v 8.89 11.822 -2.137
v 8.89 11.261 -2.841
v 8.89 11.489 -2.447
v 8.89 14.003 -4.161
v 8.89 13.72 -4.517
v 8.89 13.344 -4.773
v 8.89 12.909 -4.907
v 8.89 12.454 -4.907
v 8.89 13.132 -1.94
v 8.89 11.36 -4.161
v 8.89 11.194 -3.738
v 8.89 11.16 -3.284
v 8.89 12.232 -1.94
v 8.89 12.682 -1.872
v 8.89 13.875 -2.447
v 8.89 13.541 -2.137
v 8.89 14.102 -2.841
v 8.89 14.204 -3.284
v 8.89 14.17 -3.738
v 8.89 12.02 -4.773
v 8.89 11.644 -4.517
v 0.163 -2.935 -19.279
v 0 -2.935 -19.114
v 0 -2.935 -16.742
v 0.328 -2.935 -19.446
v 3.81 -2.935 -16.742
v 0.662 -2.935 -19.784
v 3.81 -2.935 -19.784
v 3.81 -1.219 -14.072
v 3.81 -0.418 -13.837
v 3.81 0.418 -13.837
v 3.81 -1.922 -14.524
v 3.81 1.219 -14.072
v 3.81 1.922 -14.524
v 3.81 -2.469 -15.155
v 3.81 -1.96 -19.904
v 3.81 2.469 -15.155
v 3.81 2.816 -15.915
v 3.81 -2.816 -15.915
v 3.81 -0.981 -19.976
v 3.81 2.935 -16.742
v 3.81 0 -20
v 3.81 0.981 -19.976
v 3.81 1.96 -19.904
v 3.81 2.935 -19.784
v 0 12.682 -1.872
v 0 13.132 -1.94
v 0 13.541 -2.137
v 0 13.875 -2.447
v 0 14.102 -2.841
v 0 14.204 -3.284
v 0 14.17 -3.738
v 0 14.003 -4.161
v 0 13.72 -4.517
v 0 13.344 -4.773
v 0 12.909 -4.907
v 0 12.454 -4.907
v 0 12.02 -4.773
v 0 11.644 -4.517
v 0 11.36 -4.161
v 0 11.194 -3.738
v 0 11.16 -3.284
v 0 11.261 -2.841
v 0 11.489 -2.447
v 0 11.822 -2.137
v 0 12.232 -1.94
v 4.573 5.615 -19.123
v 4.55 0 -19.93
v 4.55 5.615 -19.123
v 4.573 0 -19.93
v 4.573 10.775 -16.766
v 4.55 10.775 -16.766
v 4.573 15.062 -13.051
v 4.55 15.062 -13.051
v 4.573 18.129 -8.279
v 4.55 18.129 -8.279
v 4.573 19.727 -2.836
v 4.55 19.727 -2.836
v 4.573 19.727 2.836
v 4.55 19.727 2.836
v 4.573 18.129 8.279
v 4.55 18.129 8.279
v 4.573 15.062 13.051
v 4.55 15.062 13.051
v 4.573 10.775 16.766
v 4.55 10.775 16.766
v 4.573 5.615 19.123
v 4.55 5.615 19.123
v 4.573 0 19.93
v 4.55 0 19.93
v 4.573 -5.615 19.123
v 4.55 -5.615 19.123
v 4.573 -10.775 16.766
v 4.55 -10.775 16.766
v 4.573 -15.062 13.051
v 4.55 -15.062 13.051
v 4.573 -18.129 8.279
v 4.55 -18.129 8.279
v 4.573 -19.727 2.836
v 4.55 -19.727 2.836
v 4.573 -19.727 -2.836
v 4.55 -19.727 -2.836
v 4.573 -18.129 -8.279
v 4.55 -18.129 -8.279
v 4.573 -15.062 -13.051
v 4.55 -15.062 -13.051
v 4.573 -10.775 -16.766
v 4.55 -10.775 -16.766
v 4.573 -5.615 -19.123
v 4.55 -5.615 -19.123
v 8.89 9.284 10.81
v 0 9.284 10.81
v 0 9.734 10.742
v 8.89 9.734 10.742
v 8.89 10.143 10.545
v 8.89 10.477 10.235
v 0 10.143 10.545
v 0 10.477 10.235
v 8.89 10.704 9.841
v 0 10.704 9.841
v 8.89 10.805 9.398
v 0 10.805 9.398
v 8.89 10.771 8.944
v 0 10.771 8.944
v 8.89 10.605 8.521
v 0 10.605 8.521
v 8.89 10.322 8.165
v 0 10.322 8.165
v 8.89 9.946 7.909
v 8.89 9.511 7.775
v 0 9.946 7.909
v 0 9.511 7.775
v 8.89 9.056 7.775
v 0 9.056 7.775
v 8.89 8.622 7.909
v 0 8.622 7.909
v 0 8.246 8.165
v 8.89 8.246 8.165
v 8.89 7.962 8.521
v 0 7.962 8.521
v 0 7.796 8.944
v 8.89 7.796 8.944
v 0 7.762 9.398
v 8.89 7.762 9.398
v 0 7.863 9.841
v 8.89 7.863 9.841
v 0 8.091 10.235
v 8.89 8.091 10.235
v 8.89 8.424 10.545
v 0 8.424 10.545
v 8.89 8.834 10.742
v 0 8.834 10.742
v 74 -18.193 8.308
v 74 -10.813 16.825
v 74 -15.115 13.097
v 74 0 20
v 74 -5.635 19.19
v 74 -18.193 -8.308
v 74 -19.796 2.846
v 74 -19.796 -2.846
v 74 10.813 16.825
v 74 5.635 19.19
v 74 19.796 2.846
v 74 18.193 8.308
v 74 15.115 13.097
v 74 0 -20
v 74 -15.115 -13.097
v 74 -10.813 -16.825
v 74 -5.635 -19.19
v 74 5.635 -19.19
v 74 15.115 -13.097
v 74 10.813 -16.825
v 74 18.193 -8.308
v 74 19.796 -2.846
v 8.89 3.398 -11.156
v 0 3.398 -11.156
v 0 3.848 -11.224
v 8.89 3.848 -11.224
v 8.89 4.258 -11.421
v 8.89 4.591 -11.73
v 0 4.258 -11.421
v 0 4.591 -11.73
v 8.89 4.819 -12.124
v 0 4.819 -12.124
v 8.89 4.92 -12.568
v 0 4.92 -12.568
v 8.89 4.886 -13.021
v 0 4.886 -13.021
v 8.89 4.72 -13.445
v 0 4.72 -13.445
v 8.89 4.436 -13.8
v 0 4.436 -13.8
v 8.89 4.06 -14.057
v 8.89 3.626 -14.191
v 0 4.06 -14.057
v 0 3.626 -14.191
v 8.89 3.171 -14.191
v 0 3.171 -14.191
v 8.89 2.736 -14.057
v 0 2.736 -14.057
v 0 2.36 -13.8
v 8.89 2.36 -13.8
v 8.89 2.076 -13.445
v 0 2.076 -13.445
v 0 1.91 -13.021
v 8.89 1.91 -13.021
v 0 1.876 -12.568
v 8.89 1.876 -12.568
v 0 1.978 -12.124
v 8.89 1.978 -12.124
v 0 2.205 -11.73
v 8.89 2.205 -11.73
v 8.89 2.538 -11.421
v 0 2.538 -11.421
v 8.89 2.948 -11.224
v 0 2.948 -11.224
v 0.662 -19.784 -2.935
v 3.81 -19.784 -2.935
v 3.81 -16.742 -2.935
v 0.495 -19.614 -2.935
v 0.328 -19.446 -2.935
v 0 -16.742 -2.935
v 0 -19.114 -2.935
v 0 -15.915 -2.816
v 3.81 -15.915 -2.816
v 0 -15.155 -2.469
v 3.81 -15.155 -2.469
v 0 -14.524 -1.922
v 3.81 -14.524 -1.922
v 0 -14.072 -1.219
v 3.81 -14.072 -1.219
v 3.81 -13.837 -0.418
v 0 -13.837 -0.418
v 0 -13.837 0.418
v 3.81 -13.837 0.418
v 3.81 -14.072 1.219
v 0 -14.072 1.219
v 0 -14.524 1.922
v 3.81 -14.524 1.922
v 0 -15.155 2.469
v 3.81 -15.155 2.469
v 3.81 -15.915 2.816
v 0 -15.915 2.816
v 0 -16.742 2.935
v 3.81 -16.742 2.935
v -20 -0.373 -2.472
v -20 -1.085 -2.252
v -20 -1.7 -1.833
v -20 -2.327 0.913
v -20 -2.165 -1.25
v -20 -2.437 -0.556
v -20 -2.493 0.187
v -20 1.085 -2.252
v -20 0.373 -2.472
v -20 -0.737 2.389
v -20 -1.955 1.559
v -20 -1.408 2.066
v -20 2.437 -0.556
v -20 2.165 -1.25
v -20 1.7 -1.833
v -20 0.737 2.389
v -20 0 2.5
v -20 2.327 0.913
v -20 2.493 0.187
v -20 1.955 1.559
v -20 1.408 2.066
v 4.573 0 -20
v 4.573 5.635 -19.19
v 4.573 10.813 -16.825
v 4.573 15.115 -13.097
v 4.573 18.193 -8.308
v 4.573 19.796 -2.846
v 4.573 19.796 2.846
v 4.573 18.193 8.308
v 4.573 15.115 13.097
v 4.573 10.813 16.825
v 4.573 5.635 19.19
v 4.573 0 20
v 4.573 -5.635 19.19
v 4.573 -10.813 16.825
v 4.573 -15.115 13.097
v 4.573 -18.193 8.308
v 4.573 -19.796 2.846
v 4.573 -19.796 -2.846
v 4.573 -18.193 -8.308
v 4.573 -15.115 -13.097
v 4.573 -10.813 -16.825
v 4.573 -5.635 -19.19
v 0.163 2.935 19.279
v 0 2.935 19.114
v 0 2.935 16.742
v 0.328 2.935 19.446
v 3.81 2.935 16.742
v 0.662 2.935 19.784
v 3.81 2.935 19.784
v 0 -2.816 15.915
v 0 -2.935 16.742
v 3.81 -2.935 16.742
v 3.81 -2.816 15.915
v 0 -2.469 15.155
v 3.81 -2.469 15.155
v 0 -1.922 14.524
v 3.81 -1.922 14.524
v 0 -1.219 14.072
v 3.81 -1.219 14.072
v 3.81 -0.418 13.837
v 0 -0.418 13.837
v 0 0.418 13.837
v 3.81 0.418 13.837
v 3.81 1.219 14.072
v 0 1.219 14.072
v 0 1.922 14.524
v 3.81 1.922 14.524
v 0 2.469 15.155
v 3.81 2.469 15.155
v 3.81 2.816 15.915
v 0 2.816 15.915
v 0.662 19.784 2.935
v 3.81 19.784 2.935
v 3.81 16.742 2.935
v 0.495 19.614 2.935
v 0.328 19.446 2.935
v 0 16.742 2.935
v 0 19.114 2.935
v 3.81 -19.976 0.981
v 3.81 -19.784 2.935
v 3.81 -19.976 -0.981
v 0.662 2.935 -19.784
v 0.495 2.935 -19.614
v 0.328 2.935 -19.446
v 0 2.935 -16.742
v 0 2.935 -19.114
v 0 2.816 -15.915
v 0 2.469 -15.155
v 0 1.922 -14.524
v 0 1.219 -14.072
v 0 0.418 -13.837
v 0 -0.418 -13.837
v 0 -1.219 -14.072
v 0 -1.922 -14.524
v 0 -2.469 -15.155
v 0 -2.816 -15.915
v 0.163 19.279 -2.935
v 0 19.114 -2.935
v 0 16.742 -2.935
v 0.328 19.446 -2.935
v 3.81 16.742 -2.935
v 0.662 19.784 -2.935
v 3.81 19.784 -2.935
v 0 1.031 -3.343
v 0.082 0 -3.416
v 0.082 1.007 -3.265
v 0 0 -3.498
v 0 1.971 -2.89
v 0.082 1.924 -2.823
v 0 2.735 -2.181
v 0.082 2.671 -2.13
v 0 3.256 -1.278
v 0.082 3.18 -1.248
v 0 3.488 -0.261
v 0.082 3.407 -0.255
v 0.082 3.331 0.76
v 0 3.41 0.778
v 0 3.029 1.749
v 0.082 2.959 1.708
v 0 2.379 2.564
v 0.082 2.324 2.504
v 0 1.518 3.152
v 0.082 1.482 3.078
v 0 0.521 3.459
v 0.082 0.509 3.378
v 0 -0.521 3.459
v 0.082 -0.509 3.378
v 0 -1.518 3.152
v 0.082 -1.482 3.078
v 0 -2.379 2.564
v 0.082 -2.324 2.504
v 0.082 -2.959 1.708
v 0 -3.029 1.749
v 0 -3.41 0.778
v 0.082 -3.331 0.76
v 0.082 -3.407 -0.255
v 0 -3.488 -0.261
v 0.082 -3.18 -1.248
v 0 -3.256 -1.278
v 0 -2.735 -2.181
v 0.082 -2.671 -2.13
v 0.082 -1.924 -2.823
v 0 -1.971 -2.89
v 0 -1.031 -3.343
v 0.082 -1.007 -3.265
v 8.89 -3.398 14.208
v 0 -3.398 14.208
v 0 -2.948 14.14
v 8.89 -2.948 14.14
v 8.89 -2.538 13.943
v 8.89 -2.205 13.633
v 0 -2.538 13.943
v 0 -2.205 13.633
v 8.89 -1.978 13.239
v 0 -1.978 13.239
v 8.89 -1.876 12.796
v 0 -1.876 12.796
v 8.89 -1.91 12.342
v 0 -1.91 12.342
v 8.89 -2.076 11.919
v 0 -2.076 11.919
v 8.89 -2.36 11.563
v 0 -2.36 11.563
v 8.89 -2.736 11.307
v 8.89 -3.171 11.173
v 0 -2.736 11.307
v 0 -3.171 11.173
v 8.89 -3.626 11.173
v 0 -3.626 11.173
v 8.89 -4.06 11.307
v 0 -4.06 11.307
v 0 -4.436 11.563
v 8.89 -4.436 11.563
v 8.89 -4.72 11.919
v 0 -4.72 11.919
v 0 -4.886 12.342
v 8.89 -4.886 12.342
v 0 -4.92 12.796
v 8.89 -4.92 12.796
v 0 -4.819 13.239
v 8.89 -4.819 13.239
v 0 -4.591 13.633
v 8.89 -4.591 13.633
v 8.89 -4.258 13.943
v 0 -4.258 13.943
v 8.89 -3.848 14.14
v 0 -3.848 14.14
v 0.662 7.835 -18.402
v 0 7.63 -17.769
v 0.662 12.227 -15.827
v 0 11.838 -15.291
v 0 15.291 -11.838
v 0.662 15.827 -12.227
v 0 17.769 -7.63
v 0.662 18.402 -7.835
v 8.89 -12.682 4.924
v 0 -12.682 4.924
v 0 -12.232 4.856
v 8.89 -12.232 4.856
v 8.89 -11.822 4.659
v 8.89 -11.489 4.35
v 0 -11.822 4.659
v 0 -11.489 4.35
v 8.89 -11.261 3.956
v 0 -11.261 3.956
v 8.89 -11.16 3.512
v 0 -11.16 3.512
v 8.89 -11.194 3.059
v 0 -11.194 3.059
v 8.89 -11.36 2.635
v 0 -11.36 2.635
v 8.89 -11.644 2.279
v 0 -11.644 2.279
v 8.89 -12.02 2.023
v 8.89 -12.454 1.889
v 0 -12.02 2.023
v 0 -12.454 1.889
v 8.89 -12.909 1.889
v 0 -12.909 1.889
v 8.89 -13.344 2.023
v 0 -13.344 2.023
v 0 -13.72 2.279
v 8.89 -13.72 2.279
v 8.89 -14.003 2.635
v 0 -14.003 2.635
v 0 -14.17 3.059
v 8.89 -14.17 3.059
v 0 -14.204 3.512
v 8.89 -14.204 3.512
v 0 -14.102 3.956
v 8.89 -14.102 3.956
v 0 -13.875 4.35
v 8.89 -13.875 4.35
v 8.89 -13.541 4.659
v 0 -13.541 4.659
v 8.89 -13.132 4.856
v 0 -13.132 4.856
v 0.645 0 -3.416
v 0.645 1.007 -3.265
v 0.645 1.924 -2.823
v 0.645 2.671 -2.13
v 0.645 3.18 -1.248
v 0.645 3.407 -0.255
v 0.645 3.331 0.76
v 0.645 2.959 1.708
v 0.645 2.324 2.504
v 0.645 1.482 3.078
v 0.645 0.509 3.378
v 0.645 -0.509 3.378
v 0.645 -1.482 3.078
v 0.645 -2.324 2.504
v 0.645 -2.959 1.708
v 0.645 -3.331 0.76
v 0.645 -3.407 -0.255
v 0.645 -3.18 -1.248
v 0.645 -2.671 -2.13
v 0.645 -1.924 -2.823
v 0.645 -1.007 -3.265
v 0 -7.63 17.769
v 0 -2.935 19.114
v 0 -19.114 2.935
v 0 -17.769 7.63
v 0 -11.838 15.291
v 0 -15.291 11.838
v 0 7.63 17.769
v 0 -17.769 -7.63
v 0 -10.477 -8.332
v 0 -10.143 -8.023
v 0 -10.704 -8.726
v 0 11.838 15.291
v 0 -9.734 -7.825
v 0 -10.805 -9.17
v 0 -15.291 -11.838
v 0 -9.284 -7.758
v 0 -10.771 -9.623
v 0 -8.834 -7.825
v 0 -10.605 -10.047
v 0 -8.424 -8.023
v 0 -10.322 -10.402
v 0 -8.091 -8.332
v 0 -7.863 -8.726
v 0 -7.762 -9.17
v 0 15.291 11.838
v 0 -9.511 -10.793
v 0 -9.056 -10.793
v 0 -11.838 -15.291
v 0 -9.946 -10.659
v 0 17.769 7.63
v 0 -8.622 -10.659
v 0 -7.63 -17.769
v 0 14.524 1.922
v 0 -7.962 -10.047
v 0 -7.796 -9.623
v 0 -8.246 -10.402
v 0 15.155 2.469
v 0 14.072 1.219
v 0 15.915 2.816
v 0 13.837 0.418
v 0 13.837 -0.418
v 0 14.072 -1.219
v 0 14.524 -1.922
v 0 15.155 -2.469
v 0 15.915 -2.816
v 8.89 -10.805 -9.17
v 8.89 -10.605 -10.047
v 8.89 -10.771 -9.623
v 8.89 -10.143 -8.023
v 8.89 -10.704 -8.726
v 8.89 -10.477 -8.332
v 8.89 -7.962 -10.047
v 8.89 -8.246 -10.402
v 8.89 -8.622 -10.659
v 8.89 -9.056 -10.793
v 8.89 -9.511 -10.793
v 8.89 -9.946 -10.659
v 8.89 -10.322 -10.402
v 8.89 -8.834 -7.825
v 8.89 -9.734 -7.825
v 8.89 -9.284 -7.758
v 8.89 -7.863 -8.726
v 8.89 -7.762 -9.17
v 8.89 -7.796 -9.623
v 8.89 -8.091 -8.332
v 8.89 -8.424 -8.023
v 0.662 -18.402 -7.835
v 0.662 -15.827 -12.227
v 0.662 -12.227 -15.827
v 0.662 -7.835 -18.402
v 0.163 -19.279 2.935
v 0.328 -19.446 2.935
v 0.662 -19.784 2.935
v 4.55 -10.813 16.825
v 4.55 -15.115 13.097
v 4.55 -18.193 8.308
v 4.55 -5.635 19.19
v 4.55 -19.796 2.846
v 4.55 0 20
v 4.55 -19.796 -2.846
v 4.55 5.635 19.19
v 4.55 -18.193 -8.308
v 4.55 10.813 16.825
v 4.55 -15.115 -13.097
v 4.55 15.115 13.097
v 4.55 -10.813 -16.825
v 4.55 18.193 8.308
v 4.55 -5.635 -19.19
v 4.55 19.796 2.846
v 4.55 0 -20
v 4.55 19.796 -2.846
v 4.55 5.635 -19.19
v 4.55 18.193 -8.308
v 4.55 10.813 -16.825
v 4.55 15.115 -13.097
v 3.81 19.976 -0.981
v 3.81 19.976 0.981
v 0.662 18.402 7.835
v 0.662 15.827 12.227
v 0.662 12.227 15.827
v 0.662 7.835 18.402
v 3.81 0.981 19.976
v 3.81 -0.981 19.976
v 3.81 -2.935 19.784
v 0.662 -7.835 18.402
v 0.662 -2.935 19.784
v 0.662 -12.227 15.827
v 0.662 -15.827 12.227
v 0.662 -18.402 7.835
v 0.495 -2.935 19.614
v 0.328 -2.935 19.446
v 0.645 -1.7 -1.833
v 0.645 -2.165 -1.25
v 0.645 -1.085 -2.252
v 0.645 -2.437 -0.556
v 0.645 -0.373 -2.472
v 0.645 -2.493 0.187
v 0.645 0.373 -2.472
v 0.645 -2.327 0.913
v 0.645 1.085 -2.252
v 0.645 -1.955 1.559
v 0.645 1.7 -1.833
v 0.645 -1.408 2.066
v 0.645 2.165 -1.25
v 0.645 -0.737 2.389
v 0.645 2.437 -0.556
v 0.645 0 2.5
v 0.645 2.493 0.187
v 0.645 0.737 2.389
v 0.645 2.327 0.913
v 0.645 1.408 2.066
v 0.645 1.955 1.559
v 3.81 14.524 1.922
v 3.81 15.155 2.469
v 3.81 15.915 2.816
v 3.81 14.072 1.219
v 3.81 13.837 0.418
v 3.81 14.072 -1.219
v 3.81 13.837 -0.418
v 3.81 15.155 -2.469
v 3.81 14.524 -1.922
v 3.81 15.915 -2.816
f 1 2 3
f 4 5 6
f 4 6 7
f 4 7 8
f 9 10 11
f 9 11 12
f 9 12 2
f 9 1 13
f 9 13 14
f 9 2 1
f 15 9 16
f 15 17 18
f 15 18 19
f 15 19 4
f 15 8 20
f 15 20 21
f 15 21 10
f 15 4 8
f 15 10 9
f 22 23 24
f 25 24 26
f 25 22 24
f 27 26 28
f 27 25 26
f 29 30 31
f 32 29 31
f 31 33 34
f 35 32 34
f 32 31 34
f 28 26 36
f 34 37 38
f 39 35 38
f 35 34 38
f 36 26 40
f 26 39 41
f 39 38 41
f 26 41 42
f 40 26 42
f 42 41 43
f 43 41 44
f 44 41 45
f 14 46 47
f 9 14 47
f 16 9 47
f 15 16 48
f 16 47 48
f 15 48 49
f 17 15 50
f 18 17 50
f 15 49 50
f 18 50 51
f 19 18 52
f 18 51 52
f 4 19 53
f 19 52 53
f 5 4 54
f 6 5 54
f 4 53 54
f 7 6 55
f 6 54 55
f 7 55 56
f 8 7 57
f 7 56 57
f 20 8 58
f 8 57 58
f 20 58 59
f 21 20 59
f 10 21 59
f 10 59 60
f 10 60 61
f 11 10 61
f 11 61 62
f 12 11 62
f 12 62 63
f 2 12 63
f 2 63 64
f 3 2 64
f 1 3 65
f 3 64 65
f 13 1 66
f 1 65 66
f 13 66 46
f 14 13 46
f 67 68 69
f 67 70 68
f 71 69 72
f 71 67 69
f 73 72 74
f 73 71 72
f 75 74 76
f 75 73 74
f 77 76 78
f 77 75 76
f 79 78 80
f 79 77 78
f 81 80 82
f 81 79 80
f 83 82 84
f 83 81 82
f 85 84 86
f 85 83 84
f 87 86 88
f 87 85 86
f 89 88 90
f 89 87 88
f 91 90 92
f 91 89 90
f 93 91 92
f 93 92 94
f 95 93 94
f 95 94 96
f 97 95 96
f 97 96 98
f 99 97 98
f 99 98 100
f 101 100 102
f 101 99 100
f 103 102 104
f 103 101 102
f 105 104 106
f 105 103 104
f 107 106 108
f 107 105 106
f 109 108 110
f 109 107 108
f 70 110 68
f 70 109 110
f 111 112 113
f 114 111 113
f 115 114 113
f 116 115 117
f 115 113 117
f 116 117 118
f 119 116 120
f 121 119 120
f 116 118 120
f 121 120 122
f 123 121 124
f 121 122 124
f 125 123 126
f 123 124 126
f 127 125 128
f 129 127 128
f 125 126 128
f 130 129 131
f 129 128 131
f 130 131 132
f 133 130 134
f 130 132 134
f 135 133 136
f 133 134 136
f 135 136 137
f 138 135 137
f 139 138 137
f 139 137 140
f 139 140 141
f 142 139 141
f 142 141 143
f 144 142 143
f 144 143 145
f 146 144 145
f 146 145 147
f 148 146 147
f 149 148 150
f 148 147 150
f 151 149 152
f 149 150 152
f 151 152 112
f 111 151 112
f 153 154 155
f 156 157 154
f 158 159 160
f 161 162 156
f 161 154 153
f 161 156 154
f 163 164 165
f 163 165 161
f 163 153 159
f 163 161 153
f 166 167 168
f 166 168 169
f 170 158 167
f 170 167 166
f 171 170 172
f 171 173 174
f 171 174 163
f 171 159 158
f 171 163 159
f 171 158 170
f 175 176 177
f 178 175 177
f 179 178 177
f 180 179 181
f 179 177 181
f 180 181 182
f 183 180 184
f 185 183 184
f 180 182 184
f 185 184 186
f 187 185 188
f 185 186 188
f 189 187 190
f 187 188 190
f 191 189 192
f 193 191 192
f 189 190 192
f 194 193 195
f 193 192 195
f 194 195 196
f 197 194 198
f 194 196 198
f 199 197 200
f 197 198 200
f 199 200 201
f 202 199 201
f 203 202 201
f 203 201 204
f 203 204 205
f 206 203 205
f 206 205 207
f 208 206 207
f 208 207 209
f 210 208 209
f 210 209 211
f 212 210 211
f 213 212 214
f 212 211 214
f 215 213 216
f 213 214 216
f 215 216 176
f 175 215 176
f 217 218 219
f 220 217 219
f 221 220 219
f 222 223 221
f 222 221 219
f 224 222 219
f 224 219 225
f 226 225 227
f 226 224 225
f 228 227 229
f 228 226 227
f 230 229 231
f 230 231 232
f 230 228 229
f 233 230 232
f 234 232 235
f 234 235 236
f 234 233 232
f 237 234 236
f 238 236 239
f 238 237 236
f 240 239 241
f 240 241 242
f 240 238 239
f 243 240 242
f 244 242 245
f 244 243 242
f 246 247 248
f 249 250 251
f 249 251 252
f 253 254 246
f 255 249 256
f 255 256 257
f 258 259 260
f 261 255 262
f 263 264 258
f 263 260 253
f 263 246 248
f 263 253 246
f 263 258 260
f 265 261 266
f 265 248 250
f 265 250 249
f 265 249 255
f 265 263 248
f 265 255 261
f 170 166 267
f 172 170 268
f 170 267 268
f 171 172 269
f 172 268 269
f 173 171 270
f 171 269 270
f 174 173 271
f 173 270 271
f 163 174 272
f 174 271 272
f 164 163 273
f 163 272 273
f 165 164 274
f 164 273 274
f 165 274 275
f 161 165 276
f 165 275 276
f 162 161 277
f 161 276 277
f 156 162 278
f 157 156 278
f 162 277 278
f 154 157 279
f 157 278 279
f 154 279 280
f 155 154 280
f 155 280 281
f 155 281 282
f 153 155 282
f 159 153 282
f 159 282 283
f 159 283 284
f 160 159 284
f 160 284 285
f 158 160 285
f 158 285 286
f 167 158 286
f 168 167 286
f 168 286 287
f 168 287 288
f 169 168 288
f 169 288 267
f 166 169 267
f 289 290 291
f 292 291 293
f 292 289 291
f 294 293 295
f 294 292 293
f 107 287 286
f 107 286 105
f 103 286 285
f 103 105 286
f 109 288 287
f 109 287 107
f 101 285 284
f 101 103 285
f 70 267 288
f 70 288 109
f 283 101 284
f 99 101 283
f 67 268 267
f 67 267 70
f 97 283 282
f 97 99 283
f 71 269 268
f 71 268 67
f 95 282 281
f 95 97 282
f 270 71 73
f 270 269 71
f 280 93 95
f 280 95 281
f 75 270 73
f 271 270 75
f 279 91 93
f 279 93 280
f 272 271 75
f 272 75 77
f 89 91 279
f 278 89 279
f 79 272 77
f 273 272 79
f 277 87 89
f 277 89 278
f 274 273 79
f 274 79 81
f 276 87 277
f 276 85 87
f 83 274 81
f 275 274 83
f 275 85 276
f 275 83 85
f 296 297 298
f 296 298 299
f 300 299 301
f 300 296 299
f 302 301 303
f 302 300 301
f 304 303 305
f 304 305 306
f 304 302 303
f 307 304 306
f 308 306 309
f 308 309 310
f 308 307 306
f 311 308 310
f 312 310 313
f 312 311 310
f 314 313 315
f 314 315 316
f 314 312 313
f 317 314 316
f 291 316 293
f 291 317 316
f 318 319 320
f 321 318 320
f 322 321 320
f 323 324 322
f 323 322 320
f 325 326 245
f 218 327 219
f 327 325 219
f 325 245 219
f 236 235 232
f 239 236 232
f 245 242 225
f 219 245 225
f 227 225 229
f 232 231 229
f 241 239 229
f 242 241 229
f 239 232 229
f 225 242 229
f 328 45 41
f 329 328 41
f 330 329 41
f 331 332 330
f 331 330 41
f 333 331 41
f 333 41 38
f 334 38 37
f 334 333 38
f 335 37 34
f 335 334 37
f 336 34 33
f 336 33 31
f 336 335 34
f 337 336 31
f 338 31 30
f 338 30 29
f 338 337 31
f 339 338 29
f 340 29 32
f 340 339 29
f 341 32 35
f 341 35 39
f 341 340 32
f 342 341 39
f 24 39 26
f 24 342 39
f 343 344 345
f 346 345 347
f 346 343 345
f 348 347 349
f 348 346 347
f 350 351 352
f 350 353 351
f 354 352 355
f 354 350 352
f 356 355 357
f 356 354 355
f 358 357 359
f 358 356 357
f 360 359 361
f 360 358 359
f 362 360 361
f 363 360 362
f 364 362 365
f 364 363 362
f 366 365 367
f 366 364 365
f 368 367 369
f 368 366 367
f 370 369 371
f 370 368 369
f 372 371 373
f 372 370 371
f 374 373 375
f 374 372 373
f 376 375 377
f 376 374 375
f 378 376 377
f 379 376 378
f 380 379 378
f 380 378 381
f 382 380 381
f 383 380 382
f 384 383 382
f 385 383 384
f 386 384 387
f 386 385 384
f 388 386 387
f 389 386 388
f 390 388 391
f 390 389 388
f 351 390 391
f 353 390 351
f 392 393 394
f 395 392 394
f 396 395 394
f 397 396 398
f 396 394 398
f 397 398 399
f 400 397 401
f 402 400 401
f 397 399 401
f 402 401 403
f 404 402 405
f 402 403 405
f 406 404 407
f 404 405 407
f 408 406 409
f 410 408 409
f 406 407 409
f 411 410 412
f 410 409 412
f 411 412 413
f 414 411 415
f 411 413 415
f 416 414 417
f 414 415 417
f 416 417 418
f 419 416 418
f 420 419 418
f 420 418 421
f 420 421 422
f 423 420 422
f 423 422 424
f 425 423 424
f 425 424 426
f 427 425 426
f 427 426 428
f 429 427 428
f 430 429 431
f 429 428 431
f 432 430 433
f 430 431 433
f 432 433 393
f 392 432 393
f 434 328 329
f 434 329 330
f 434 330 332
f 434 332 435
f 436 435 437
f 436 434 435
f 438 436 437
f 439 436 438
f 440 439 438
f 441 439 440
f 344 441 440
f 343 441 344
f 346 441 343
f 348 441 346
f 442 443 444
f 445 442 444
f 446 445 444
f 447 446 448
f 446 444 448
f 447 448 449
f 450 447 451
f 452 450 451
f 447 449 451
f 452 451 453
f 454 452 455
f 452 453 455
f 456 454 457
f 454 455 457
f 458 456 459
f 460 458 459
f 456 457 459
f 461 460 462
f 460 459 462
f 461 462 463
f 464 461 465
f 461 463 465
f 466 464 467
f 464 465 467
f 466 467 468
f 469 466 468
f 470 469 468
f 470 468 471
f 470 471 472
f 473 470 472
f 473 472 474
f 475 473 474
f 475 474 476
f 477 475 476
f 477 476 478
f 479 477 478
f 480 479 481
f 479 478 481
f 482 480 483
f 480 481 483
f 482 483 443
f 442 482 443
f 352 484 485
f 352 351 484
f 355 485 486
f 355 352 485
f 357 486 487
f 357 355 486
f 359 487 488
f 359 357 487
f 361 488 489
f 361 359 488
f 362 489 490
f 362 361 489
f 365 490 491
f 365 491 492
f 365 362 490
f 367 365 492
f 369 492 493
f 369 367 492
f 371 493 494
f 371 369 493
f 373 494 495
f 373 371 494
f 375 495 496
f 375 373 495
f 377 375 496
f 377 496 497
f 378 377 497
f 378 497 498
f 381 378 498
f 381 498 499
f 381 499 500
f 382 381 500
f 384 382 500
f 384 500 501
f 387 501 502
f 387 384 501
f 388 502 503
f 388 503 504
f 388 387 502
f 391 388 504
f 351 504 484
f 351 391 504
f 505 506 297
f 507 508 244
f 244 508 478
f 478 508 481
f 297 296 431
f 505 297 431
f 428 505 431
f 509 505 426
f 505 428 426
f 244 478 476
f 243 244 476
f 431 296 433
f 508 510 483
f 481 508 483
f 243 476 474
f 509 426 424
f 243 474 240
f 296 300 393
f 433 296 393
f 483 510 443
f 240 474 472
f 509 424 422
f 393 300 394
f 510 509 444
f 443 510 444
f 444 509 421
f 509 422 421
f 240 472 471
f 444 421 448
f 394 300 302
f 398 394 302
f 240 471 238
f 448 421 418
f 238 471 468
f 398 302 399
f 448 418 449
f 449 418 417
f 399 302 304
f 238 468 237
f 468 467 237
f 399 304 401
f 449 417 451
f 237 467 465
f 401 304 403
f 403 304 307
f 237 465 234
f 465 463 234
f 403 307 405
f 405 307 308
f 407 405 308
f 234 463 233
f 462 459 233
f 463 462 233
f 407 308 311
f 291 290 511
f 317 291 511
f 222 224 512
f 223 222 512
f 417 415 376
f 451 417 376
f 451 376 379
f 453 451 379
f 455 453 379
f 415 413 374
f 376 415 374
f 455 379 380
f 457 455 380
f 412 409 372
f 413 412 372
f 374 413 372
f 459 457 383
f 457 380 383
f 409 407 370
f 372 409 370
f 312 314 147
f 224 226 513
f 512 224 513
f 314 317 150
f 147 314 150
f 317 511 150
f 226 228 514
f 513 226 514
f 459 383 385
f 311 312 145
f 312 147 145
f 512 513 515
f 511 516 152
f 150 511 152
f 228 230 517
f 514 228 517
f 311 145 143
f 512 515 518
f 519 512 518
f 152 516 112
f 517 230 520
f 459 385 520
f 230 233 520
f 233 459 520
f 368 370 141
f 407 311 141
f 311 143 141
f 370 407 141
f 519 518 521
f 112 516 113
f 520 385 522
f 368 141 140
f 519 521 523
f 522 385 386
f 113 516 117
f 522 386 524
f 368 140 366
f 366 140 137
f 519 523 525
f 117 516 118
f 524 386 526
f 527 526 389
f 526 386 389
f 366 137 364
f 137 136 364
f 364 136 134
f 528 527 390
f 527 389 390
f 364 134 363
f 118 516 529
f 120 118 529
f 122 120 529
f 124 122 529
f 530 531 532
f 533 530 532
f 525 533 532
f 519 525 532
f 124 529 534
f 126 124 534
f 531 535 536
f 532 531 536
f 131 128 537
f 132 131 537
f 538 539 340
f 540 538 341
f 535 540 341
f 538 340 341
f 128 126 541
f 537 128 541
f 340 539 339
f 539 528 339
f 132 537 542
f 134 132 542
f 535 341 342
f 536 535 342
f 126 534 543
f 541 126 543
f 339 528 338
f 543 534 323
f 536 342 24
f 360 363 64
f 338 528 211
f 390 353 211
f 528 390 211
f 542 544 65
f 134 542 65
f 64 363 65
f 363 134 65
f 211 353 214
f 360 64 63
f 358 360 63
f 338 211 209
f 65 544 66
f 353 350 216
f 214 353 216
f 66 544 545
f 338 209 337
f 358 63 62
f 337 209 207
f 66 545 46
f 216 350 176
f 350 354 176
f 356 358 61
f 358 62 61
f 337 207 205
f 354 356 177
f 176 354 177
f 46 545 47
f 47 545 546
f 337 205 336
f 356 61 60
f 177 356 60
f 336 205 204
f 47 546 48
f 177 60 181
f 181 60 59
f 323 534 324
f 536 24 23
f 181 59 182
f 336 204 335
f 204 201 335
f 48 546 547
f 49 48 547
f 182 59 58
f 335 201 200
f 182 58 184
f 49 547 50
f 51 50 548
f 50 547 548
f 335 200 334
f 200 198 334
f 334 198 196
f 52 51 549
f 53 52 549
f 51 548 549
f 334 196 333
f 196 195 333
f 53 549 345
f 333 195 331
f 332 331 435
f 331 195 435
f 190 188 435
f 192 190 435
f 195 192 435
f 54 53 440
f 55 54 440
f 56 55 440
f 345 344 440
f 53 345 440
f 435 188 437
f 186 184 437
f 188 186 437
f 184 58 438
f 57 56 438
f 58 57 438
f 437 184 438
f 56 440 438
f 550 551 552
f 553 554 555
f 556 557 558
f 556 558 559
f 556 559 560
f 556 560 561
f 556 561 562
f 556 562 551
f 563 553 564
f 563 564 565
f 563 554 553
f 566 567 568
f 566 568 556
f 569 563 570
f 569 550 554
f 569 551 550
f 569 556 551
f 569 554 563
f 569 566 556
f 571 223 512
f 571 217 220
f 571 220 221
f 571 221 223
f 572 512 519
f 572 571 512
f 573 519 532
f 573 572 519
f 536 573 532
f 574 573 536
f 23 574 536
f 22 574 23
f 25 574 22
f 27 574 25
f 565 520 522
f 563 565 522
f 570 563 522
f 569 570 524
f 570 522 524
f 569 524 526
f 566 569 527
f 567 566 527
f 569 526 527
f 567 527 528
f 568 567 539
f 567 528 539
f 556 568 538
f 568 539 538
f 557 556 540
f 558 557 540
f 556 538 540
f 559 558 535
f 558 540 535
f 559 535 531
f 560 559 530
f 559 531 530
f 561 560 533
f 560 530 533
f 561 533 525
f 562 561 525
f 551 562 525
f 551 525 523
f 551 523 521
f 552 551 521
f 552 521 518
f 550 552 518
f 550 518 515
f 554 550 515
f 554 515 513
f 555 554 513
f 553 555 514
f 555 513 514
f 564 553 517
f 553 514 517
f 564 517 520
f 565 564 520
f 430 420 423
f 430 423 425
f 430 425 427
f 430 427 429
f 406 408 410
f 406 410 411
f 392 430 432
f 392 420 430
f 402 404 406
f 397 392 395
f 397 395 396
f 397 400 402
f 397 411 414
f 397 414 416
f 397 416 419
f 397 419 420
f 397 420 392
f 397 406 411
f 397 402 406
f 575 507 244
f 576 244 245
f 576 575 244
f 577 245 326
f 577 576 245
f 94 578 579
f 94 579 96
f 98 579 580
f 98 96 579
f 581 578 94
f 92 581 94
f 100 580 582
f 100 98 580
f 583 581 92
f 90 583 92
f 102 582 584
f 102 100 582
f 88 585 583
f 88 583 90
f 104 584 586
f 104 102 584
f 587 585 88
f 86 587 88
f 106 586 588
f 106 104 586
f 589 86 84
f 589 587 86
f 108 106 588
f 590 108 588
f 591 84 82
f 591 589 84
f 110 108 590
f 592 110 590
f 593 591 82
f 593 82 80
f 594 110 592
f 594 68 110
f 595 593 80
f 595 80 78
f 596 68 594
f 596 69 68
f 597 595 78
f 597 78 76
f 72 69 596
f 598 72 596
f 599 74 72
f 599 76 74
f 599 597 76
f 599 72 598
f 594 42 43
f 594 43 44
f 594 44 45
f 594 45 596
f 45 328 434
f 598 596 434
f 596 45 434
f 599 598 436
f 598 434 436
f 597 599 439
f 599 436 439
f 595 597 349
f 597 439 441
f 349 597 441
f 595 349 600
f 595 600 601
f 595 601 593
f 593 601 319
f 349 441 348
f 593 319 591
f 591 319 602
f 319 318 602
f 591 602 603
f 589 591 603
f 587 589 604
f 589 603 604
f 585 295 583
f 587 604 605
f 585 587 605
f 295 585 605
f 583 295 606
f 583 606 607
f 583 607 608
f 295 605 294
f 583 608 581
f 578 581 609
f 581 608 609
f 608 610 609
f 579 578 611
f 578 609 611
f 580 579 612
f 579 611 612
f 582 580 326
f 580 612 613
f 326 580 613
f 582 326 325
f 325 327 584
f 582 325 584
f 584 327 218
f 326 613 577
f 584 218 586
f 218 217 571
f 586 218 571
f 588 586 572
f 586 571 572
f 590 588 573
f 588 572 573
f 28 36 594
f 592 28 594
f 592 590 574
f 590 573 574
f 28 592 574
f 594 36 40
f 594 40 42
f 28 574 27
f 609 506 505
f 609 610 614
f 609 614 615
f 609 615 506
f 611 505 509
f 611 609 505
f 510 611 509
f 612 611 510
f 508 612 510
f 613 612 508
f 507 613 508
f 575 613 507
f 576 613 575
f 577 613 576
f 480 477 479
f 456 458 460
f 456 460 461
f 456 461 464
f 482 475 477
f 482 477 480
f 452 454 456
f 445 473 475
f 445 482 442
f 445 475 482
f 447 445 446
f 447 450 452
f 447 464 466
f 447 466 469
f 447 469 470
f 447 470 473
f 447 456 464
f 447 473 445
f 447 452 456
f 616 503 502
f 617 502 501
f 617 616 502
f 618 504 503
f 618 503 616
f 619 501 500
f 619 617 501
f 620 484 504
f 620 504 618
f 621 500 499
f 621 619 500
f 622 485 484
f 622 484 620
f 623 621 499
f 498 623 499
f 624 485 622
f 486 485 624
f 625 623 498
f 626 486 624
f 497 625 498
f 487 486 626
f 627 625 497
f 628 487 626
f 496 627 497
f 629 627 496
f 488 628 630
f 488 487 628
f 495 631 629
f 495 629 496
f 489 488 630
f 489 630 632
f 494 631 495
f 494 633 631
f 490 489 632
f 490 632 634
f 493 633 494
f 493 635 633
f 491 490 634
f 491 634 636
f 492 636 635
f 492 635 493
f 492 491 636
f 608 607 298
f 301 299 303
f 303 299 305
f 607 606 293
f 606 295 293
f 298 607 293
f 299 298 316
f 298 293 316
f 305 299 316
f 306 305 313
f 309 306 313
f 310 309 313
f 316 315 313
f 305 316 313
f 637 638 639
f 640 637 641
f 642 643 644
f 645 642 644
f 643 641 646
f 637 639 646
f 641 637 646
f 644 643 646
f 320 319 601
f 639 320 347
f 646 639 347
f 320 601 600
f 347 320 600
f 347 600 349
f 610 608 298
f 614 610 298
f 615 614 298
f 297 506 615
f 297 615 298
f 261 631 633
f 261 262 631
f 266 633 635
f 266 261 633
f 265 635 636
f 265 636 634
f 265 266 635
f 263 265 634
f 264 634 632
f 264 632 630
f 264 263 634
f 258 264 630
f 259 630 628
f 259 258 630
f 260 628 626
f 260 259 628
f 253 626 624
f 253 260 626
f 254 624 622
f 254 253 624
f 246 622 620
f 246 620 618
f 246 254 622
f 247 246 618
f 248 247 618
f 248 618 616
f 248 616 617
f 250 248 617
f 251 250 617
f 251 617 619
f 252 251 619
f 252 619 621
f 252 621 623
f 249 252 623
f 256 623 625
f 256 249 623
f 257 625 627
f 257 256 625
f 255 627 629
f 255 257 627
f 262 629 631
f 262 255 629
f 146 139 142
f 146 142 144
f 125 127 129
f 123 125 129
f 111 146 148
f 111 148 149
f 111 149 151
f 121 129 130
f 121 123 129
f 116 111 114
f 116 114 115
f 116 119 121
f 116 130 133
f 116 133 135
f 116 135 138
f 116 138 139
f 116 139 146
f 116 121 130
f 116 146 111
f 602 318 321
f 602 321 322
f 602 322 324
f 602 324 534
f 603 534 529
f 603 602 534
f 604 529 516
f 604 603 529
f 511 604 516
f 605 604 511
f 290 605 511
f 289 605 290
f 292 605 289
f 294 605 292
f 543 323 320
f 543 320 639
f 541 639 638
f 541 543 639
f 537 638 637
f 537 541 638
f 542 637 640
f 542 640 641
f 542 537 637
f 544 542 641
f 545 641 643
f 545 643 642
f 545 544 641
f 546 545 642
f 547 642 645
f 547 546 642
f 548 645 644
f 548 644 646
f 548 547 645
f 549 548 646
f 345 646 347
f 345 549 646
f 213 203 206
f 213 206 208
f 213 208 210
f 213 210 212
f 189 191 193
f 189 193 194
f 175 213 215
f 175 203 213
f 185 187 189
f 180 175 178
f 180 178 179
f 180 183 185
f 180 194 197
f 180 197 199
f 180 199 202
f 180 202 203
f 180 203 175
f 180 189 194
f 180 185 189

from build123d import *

# Parameters (mm, degrees)
SKETCH1_R                       = 20
BOSS_EXTRUDE1_DEPTH             = 74
SKETCH2_R                       = 2.5
BOSS_EXTRUDE2_DEPTH             = 20
BOSS_EXTRUDE2_DIRECTION_2_REACH = 76
CUT_EXTRUDE1_DEPTH              = 3.81
SKETCH7_R                       = 1.526021313
CUT_EXTRUDE2_DEPTH              = 8.89


with BuildPart() as part:
    # Sketch1 → Boss-Extrude1 (new body)
    with BuildSketch(Plane(origin=(0, 0, 0), x_dir=(0, 0, -1), z_dir=(1, 0, 0))):
        Circle(SKETCH1_R)
    extrude(amount=BOSS_EXTRUDE1_DEPTH)

    # Sketch5 → Cut-Revolve1 (revolve, cut)
    with BuildSketch(Plane(origin=(0, 0, 0), x_dir=(1, 0, 0), z_dir=(0, 1, 0))):
        Polygon((0, 19.337777094), (0.662222906, 20), (0.662222906, 20.176229402), (4.550138216, 20.176229402), (4.550138216, 19.930023338), (4.572872876, 19.930023338), (4.572872876, 20.70759824), (0.489891522, 20.70759824), (-0.879929624, 19.337777094), align=None)
        Polygon((0, 0), (0.645058213, 0), (0.645058213, 3.416287186), (0.081805863, 3.416287186), (0, 3.498093049), (-0.347704824, 3.498093049), (-0.347704824, 0), align=None)
    revolve(axis=Axis((-44.161448521, 0, 0), (1, 0, 0)), mode=Mode.SUBTRACT)

    # Sketch2 → Boss-Extrude2 (add)
    with BuildSketch(Plane.ZY):
        Circle(SKETCH2_R)
    extrude(amount=BOSS_EXTRUDE2_DEPTH)

    # Sketch2 → Boss-Extrude2 direction 2 (add, up to next)
    with BuildSketch(Plane.ZY, mode=Mode.PRIVATE) as boss_extrude2_direction_2_sk1:
        Circle(SKETCH2_R)
    boss_extrude2_direction_2_tool1 = extrude(boss_extrude2_direction_2_sk1.sketch, amount=-BOSS_EXTRUDE2_DIRECTION_2_REACH, mode=Mode.PRIVATE) - part.part
    add(boss_extrude2_direction_2_tool1.solids().sort_by_distance((0, 0, 0))[0])

    # Sketch6 → Cut-Extrude1 (cut)
    with BuildSketch(Plane.ZY):
        with BuildLine():
            Line((-2.93474373, 16.742014233), (-2.93474373, 20.766805635))
            Line((-2.93474373, 20.766805635), (2.93474373, 20.766805635))
            Line((2.93474373, 20.766805635), (2.93474373, 16.742014233))
            ThreePointArc((2.93474373, 16.742014233), (0, 13.807270503), (-2.93474373, 16.742014233))
        make_face()
        with BuildLine():
            Line((20.766805635, -2.93474373), (16.742014233, -2.93474373))
            ThreePointArc((16.742014233, -2.93474373), (13.807270503, 0), (16.742014233, 2.93474373))
            Line((16.742014233, 2.93474373), (20.766805635, 2.93474373))
            Line((20.766805635, 2.93474373), (20.766805635, -2.93474373))
        make_face()
        with BuildLine():
            Line((-2.93474373, -20.766805635), (-2.93474373, -16.742014233))
            ThreePointArc((-2.93474373, -16.742014233), (0, -13.807270503), (2.93474373, -16.742014233))
            Line((2.93474373, -16.742014233), (2.93474373, -20.766805635))
            Line((2.93474373, -20.766805635), (-2.93474373, -20.766805635))
        make_face()
        with BuildLine():
            Line((-20.766805635, 2.93474373), (-16.742014233, 2.93474373))
            ThreePointArc((-16.742014233, 2.93474373), (-13.807270503, 0), (-16.742014233, -2.93474373))
            Line((-16.742014233, -2.93474373), (-20.766805635, -2.93474373))
            Line((-20.766805635, -2.93474373), (-20.766805635, 2.93474373))
        make_face()
    extrude(amount=-CUT_EXTRUDE1_DEPTH, mode=Mode.SUBTRACT)

    # Sketch7 → Cut-Extrude2 (cut)
    with BuildSketch(Plane.ZY):
        with Locations((-3.398071731, 12.681776348)):
            Circle(SKETCH7_R)
        with Locations((9.283704617, 9.283704617)):
            Circle(SKETCH7_R)
        with Locations((12.681776348, -3.398071731)):
            Circle(SKETCH7_R)
        with Locations((3.398071731, -12.681776348)):
            Circle(SKETCH7_R)
        with Locations((-9.283704617, -9.283704617)):
            Circle(SKETCH7_R)
        with Locations((-12.681776348, 3.398071731)):
            Circle(SKETCH7_R)
    extrude(amount=-CUT_EXTRUDE2_DEPTH, mode=Mode.SUBTRACT)


solid = part.part
